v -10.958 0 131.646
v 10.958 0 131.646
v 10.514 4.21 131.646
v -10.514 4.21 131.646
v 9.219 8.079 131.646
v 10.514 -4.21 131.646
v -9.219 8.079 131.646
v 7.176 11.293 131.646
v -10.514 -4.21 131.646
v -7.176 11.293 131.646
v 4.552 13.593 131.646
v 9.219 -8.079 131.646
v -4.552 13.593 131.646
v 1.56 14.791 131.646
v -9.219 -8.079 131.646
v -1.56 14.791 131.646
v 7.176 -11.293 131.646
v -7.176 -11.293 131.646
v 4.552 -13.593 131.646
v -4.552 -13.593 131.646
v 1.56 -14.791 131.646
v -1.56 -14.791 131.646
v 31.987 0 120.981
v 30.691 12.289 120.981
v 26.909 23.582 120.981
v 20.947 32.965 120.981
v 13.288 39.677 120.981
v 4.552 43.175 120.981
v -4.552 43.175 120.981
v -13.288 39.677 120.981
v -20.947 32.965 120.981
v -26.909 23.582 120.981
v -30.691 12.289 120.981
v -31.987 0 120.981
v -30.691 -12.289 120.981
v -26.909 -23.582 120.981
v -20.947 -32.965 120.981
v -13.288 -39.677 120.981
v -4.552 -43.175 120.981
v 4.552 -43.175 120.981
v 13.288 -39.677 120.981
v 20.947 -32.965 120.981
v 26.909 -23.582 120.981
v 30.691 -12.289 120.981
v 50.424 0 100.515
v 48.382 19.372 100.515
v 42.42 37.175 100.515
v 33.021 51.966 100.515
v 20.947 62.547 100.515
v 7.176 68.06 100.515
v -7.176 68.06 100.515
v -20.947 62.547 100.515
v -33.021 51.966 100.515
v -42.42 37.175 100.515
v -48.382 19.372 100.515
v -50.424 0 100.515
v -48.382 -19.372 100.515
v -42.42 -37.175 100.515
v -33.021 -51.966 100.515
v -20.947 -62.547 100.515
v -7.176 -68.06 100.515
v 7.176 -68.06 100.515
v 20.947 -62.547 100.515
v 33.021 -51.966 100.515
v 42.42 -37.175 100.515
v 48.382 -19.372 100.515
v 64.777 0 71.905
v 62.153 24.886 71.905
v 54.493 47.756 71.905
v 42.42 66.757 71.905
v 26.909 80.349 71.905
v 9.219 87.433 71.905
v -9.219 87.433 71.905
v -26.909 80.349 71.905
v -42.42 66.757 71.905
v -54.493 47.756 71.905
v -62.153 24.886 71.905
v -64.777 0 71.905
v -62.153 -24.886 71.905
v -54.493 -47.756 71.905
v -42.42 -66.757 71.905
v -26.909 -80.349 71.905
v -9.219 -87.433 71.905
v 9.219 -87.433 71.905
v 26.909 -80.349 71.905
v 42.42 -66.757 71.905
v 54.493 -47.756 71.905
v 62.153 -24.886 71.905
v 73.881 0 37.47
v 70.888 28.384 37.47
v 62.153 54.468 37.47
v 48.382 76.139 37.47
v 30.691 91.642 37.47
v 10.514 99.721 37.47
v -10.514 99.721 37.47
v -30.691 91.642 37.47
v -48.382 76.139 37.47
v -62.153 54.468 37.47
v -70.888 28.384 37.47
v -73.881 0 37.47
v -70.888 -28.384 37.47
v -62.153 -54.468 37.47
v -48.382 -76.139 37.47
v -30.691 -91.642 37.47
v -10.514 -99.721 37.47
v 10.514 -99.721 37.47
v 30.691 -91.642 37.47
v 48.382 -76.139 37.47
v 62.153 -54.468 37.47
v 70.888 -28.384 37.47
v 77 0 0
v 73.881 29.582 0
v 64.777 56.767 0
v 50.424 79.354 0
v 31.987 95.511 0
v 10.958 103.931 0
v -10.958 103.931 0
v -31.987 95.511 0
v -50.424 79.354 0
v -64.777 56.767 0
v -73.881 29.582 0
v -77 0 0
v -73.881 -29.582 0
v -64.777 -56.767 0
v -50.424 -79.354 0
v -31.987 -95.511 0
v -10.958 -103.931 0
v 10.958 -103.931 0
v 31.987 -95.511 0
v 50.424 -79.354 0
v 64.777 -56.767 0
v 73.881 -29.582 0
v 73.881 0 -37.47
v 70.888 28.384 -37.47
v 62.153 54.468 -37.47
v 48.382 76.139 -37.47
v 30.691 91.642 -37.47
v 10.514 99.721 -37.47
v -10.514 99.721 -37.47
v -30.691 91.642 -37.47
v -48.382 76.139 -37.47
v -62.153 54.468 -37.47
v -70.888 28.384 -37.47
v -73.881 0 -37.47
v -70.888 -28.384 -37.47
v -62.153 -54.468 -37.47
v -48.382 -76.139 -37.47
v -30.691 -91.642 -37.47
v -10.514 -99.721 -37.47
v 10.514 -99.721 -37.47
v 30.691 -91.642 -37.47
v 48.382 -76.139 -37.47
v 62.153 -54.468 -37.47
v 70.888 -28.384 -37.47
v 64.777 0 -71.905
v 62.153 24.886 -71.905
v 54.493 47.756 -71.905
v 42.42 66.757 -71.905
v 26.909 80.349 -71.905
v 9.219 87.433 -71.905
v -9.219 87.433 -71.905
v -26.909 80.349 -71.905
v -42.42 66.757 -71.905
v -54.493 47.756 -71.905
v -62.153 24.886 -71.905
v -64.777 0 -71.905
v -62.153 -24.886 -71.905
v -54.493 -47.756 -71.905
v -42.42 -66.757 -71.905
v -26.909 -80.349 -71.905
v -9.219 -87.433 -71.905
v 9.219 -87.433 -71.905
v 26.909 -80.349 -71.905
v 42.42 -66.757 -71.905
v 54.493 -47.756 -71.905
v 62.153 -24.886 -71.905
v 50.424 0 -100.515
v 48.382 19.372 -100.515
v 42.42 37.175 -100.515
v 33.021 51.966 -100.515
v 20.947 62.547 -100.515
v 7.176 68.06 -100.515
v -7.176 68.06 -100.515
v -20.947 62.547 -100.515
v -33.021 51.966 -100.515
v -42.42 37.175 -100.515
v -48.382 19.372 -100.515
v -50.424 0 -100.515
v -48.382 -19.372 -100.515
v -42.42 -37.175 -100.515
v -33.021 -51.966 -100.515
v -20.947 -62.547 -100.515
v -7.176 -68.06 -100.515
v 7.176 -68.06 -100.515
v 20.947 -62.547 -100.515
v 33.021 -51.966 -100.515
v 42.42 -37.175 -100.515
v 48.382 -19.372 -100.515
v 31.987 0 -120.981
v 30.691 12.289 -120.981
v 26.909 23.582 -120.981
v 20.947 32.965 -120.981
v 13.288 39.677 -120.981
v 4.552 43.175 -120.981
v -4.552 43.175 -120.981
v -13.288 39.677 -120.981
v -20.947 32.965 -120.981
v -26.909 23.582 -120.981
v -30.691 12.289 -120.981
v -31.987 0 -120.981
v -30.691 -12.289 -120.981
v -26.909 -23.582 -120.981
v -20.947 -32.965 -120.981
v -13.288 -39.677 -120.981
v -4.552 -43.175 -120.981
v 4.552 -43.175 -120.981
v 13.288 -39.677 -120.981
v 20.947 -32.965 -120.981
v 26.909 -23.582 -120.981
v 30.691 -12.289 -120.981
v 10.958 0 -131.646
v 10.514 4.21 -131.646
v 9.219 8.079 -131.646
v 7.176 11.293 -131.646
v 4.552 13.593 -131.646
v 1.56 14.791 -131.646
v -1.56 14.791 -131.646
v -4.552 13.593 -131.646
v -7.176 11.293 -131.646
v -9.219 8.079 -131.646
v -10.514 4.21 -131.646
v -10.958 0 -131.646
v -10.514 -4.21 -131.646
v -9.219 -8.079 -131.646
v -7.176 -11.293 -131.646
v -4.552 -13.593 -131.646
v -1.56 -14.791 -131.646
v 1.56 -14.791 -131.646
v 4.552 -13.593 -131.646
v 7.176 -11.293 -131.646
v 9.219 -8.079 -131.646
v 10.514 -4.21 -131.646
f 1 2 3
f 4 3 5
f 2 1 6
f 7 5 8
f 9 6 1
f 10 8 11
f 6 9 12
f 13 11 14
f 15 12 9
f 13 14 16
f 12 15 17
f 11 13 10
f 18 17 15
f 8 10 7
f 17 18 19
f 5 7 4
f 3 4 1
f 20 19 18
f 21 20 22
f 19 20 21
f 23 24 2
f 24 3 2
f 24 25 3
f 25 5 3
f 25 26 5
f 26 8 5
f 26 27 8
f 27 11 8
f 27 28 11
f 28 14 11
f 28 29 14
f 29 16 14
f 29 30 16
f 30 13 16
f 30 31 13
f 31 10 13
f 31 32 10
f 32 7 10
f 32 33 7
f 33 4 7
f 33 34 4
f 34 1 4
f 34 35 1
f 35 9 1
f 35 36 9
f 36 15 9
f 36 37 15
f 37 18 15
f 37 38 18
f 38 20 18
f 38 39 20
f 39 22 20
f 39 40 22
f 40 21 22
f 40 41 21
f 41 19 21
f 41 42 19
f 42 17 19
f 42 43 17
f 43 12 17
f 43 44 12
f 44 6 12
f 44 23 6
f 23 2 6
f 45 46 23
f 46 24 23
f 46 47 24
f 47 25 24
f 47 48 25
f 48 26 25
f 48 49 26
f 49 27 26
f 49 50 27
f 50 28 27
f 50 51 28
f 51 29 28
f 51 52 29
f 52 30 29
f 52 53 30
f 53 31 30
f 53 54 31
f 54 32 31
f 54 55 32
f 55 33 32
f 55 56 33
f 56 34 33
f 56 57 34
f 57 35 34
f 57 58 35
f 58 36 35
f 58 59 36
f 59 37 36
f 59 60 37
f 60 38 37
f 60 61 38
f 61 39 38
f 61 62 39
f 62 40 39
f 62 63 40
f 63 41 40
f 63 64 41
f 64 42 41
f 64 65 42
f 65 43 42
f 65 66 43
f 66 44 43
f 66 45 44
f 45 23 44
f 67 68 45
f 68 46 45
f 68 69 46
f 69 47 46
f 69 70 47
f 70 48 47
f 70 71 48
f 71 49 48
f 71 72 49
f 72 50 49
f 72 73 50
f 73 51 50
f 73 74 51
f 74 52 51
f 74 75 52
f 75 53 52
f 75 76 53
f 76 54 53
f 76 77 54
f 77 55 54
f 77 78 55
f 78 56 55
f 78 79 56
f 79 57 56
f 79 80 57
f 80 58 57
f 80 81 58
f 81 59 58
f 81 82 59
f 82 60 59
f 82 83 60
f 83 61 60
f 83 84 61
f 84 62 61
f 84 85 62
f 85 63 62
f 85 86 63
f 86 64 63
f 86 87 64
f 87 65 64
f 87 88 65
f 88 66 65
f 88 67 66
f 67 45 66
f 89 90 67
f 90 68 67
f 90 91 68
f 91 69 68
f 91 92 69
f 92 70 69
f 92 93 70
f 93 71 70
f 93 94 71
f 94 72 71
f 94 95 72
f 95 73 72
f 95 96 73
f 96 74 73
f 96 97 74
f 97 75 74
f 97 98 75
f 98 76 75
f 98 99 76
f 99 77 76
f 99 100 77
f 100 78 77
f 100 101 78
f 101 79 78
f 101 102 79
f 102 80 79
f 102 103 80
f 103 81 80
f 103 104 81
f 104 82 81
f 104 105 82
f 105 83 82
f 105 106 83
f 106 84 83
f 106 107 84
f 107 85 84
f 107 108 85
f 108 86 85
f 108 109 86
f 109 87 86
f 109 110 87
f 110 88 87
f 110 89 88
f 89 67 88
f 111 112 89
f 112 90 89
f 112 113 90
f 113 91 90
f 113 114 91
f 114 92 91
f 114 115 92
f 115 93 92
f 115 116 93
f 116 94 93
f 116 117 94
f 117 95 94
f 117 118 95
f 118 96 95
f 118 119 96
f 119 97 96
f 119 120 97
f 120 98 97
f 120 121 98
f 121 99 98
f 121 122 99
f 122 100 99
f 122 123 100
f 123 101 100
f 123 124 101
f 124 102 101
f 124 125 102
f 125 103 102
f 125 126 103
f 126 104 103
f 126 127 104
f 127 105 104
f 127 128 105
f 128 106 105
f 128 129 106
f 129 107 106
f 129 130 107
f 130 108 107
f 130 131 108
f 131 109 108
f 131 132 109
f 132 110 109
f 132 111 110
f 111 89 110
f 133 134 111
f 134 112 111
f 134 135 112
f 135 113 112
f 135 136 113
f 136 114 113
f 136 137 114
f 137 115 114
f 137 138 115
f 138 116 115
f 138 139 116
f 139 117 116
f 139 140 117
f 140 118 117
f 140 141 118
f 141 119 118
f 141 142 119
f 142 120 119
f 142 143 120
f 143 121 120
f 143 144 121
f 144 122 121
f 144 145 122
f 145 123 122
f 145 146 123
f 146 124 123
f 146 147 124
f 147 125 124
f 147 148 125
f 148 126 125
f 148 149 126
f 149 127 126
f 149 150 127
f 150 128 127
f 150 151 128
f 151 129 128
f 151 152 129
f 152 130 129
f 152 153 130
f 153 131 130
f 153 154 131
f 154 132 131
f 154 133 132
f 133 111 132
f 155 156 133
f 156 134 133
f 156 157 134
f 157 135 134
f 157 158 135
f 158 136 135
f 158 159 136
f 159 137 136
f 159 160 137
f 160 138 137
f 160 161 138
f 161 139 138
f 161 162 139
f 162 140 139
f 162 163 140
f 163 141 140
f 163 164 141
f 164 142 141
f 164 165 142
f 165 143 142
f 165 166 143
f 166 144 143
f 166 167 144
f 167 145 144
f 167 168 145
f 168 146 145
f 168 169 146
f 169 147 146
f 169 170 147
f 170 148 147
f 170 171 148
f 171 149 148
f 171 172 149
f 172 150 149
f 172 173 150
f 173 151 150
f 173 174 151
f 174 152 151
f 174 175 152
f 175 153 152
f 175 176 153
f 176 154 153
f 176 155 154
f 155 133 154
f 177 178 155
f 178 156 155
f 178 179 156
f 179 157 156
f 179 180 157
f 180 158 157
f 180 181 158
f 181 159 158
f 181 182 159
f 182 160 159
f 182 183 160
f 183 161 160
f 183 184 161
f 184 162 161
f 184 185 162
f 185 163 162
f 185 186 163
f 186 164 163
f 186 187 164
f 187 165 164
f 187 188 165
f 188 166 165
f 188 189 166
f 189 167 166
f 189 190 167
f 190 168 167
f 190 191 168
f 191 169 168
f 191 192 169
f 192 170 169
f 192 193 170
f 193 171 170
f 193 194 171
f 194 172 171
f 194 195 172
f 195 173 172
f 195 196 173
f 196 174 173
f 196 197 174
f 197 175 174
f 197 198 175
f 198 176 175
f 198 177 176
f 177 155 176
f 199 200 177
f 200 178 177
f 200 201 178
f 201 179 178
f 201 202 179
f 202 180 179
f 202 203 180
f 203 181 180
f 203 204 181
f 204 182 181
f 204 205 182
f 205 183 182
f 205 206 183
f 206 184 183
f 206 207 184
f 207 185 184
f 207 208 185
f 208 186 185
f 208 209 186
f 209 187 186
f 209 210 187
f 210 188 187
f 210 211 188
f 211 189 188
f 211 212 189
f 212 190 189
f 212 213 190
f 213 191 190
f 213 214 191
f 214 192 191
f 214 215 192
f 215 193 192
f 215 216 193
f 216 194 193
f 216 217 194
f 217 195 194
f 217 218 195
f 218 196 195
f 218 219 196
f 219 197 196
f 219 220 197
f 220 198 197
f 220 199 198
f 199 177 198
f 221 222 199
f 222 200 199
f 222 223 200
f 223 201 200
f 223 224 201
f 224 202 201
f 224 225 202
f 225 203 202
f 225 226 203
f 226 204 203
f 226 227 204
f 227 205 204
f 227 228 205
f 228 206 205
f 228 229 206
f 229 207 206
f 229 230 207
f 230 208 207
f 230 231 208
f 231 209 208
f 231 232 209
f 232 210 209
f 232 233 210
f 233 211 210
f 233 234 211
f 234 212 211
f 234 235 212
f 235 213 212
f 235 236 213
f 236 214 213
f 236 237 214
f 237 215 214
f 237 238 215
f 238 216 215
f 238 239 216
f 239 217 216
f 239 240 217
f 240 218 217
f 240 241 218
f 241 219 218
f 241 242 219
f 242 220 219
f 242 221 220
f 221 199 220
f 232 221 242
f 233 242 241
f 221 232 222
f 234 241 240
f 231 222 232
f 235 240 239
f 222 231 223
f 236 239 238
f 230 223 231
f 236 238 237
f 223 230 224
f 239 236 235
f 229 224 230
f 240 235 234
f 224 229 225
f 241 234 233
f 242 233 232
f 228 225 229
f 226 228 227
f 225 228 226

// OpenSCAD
// Generated by SolidPython 1.0.1 on 2020-07-29 00:46:50


scale(v = [11, 15, 19]) {
	sphere(r = 7);
}
/***********************************************
*********      SolidPython code:      **********
************************************************
 
# import packages: SolidPython
from solid import *
from solid.utils import *
from itertools import chain, combinations, permutations


class Resize:

    def __init__(self, scad_file):
        self.scad_file = scad_file
        #self.scad_file = import_scad(scad_file)
        # cone/cylinder param:
        self.r1 = 0
        self.r2 = 0
        self.h = 0
        # rectangular prism param:
        self.w = 0
        self.l = 0
        # ellipse param:
        self.r = 0

    # import OpenScad code (file name corresponds to shape)


    # classify shape + parameters
    def assign(self, param1, param2, param3):
        if self.scad_file == 'cone.scad':
            self.r1 = param1
            self.r2 = param2
            self.h = param3
        elif self.scad_file == 'cylinder.scad':
            self.r1 = param1
            self.r2 = param2
            self.h = param3
        elif self.scad_file == 'rectangularPrism.scad':
            self.h = param1
            self.l = param2
            self.w = param3
        else:
            self.r = param1
            self.h = param2

    # resize parameters
    def iterate(self):
        x = range(3, 20, 2)
        i = 1
        if self.scad_file == 'cone.scad':
            tempList = list(permutations(x, 2))
            for temp in tempList:
                param1 = temp[0]
                param2 = temp[1]
                filepath = 'produced_scad_files/' + 'cone' + str(param1) + '_' + str(param2) + '_' + '.scad'
                scad_render_to_file(cylinder(h=param1, r1=param2, r2=0), filepath)

        elif self.scad_file == 'cylinder.scad':
            tempList = list(permutations(x, 3))
            for temp in tempList:
                param1 = temp[0]
                param2 = temp[1]
                filepath = 'produced_scad_files/' + 'cylinder' + str(param1) + '_' + str(param2) + '_' + '.scad'
                scad_render_to_file(cylinder(h=param1, r1=param2, r2=param2), filepath)

        elif self.scad_file == 'rectangularPrism.scad':
            tempList = list(permutations(x, 3))
            for temp in tempList:
                param1 = temp[0]
                param2 = temp[1]
                param3 = temp[2]
                filepath = 'produced_scad_files/' + 'rectangularPrism' + str(param1) + '_' + str(param2) + '_' + str(
                    param3) + '.scad'
                scad_render_to_file(cube(size=(param1, param2, param3)), filepath)

        elif self.scad_file == 'ellipse.scad':
            tempList = list(permutations(x, 4))
            for temp in tempList:
                param1 = temp[0]
                param2 = temp[1]
                param3 = temp[2]
                param4 = temp[3]
                filepath = 'produced_scad_files/' + 'ellipse' + str(param1) + '_' + str(param2) + '_' + str(param3) + '_' + str(param4) + '.scad'
                scad_render_to_file(scale([param1, param2, param3])(sphere(r=param4)), filepath)

    def render_to_scadfile(self):
        scad_render_to_file(scad, 'example.scad') 
 
************************************************/
